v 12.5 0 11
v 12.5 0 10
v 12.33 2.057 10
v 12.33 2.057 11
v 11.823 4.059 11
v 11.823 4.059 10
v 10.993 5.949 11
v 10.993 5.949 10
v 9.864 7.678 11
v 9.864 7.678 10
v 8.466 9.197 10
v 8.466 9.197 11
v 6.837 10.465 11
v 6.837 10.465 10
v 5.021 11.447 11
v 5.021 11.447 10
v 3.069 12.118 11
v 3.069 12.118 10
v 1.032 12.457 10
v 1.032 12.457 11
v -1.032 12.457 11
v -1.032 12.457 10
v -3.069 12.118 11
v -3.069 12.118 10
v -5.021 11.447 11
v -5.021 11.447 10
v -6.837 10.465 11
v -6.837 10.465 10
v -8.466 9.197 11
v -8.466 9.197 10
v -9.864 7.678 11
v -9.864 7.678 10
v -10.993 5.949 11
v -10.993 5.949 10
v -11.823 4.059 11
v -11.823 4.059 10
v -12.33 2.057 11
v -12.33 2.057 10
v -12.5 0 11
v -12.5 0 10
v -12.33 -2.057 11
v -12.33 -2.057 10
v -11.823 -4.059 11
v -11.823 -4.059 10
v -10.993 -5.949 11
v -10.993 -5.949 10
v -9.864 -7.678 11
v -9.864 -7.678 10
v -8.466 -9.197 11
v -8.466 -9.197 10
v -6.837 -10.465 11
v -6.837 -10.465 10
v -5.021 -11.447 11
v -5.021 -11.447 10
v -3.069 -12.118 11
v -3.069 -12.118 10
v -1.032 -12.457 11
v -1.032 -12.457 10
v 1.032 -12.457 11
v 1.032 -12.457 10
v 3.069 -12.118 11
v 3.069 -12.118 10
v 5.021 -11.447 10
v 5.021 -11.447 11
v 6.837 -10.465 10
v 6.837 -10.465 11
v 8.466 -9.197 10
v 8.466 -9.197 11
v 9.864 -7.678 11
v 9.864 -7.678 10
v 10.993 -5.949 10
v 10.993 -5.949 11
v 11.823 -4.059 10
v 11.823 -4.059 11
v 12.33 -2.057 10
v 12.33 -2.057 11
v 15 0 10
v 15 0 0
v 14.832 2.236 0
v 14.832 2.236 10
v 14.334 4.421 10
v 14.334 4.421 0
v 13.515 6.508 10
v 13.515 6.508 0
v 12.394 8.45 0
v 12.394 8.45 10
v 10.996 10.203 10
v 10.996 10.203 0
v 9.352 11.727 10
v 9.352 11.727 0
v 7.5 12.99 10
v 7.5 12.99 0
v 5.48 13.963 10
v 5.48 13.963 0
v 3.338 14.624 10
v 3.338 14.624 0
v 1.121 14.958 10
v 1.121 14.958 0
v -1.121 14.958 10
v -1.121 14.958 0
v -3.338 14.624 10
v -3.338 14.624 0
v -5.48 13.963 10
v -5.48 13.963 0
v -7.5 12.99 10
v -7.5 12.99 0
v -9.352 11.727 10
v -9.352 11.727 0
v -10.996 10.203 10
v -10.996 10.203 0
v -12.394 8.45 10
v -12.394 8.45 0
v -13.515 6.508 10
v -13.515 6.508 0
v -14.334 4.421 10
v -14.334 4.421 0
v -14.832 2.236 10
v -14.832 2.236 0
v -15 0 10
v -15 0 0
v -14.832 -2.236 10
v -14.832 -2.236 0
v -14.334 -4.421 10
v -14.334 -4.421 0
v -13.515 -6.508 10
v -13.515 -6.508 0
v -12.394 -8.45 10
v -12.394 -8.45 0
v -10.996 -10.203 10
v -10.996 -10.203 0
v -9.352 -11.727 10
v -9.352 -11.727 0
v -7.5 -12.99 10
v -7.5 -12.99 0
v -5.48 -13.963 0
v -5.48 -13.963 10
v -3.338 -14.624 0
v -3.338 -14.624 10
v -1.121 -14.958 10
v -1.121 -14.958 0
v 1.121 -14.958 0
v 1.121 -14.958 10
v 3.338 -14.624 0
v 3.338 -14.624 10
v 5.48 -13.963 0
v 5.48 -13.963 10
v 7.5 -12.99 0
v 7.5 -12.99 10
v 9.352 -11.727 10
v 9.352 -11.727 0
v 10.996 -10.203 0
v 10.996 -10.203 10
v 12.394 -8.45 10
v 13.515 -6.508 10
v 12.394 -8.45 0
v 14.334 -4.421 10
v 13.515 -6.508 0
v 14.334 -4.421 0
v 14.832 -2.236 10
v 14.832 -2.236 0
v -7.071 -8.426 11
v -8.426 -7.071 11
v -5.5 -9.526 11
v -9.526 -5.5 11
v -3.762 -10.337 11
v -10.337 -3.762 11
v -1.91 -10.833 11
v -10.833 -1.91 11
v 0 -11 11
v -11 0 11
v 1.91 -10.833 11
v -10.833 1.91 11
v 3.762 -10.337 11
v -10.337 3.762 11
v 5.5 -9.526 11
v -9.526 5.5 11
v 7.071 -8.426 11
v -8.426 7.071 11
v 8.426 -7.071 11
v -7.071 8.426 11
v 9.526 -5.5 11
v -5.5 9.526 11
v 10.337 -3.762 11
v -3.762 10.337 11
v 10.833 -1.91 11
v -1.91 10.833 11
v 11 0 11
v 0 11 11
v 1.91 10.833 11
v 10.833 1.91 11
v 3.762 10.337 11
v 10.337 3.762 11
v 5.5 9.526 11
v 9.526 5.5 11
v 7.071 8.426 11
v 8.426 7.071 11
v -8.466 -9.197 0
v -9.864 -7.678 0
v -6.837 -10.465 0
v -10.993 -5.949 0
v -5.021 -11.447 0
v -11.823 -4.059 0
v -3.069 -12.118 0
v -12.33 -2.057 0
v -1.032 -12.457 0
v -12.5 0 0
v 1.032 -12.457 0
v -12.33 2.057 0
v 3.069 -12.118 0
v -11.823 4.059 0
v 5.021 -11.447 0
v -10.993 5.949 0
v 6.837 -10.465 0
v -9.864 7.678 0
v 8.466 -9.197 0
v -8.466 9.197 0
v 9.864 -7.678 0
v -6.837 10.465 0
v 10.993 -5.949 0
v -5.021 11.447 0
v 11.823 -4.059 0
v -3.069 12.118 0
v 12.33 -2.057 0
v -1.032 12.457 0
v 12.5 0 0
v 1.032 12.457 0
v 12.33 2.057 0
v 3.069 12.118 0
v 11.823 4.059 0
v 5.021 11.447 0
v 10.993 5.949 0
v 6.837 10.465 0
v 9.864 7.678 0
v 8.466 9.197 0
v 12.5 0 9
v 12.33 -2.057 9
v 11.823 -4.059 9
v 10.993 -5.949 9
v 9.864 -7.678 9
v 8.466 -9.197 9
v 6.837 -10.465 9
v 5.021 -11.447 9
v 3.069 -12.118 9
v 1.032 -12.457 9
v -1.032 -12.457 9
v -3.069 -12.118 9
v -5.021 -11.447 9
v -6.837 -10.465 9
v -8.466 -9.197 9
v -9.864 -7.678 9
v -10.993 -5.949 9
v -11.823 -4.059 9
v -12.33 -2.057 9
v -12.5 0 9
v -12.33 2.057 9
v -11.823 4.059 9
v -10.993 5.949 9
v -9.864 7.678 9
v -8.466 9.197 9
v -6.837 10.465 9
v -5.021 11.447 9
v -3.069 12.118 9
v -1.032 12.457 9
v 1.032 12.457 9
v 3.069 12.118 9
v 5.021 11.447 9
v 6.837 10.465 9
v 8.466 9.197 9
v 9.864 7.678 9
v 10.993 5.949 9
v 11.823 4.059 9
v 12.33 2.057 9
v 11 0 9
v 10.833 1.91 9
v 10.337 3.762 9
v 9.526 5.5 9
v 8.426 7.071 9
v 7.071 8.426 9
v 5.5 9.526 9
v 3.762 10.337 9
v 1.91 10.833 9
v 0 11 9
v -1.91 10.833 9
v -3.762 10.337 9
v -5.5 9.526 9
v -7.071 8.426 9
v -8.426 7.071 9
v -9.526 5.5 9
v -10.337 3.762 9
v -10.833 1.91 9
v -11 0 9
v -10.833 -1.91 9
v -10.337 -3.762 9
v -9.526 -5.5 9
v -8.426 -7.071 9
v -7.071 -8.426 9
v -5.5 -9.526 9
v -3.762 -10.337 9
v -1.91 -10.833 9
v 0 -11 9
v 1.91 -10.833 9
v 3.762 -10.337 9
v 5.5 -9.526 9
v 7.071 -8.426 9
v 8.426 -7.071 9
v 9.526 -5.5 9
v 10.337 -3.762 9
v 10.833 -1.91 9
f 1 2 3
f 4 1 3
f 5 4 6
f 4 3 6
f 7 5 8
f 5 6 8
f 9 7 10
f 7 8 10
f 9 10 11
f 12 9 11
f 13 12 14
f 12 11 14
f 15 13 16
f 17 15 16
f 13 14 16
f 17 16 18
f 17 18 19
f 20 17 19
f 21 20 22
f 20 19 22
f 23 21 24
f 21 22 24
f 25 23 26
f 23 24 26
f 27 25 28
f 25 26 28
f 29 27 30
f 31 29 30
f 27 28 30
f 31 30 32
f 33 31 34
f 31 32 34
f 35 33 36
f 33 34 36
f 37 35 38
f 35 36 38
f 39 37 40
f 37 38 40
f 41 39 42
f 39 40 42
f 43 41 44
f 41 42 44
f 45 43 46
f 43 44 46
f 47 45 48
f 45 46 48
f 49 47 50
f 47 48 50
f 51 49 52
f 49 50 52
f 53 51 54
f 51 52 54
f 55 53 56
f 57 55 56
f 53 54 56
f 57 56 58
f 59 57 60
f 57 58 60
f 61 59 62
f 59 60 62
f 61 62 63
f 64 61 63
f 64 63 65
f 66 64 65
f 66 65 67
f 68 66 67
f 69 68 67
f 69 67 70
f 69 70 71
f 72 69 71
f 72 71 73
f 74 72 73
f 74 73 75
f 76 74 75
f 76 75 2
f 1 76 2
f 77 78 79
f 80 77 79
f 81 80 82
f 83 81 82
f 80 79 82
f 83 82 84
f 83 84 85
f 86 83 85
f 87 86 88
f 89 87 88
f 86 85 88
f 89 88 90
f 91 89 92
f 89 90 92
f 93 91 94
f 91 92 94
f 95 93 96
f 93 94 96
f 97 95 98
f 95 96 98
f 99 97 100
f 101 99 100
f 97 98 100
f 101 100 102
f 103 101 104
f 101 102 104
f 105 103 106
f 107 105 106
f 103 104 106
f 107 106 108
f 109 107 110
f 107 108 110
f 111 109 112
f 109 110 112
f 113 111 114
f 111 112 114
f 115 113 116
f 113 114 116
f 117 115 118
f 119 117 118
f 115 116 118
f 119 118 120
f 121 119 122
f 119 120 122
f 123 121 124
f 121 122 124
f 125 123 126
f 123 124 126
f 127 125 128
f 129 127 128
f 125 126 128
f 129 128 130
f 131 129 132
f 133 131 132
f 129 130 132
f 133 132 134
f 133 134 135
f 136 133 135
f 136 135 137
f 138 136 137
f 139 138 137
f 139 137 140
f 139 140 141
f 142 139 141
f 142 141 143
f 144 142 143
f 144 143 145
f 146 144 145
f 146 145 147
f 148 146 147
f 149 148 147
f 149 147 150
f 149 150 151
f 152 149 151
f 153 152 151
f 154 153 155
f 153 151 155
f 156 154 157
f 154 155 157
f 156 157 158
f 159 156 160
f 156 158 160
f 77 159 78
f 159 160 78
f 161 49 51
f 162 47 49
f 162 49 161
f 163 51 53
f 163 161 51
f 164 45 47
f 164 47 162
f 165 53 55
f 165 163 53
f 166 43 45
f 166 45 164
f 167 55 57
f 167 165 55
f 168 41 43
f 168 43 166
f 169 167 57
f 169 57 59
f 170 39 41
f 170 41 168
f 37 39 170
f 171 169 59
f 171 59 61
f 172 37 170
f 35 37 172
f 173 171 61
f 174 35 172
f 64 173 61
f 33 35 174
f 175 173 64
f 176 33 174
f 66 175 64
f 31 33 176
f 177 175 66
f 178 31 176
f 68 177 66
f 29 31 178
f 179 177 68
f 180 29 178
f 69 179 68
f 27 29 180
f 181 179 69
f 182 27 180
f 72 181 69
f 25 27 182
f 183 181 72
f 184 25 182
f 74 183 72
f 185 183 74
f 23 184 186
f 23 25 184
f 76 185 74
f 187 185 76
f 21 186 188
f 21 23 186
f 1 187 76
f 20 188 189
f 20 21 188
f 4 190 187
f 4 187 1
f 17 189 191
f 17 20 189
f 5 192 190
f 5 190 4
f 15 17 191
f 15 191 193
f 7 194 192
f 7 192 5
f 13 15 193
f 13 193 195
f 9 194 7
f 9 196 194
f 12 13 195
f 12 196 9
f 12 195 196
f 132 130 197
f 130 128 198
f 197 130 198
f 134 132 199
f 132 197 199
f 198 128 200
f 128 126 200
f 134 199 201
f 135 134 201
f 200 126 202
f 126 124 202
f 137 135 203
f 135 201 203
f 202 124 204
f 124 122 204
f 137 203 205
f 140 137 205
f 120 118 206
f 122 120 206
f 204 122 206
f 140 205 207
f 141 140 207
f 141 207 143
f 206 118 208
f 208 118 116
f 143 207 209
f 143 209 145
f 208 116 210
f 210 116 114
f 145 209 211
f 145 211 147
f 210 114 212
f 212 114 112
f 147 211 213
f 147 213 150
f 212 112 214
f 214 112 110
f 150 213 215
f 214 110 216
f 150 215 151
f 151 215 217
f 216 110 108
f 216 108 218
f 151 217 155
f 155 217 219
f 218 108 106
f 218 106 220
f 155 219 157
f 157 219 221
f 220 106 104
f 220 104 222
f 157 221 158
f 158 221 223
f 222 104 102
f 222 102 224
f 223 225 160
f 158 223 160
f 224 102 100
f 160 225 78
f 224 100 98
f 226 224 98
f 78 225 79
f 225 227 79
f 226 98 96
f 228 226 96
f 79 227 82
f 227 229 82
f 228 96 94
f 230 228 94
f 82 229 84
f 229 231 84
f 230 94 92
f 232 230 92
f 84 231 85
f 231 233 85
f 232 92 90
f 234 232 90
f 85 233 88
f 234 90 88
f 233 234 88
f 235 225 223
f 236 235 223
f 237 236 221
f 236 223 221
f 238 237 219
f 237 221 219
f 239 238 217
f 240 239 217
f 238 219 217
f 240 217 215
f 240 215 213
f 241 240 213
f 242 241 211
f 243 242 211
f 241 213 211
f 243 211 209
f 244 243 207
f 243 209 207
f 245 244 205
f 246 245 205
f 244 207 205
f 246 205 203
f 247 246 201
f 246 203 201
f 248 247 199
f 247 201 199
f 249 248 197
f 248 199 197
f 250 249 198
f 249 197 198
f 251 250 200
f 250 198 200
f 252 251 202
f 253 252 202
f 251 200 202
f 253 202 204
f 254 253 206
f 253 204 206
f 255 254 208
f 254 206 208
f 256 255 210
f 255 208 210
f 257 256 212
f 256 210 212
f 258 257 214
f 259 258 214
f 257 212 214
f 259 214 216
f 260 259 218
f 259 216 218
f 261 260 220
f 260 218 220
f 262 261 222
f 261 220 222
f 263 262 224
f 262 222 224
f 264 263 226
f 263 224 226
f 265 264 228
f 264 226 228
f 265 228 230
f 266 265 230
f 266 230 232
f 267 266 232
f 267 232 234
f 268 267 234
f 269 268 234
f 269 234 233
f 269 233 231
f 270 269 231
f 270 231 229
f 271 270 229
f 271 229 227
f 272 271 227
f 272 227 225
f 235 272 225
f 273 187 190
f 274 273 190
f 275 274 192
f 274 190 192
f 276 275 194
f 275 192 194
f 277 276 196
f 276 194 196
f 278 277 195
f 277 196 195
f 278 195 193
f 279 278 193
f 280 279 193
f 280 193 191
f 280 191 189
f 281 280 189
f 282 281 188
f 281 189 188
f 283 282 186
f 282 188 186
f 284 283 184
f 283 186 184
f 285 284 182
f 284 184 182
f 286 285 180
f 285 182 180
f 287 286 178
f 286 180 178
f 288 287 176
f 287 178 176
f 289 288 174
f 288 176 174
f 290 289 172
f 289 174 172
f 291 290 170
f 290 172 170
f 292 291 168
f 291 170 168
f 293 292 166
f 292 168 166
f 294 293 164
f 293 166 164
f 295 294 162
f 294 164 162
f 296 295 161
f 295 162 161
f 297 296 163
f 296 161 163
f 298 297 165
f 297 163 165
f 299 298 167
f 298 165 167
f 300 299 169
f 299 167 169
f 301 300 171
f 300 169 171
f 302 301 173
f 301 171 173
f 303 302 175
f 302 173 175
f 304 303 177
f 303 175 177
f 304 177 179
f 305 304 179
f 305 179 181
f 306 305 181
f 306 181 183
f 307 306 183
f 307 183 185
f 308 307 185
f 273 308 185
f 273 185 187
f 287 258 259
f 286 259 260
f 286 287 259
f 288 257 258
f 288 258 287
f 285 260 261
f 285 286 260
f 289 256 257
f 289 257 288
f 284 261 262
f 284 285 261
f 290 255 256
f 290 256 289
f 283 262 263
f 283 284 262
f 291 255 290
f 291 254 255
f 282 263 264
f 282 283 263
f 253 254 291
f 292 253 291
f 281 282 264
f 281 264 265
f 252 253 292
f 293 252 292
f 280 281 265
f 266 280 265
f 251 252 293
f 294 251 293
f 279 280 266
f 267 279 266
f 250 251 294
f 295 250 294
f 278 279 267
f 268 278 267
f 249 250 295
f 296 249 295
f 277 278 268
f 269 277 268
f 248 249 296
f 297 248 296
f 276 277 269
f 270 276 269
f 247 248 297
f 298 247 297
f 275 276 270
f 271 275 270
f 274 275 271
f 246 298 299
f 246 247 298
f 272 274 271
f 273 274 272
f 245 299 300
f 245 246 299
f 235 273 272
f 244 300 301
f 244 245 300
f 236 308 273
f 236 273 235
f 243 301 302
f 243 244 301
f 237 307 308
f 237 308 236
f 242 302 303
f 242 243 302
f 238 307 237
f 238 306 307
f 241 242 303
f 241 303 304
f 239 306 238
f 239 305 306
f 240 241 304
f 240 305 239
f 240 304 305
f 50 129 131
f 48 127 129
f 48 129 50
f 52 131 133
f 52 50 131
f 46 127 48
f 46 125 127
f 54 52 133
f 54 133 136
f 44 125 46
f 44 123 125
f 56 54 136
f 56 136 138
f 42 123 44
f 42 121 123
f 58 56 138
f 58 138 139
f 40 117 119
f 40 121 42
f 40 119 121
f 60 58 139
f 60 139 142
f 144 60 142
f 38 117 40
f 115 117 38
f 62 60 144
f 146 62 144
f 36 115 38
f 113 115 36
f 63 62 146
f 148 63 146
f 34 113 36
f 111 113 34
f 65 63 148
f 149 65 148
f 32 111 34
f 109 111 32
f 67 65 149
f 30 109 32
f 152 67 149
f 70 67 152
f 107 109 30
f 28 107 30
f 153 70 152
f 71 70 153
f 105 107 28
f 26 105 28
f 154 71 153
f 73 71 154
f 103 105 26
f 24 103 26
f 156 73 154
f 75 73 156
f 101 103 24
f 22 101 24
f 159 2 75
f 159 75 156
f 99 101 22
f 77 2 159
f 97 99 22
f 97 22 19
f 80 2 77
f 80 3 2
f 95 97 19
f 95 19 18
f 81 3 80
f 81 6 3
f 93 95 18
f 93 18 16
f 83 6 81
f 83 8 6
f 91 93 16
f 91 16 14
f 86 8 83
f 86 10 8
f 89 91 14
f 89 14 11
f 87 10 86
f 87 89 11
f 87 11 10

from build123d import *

# Parameters (mm, degrees)
ESQUISSE1_R             = 15
BOSS_EXTRU_1_DEPTH      = 10
ESQUISSE2_R             = 12.5
BOSS_EXTRU_2_DEPTH      = 1
ESQUISSE3_R             = 11
ENL_V_MAT_EXTRU_1_DEPTH = 2
ESQUISSE4_R             = 12.5
ENL_V_MAT_EXTRU_2_DEPTH = 9


with BuildPart() as part:
    # Esquisse1 → Boss.-Extru.1 (new body)
    with BuildSketch(Plane.XY):
        Circle(ESQUISSE1_R)
    extrude(amount=BOSS_EXTRU_1_DEPTH)

    # Esquisse2 → Boss.-Extru.2 (add)
    with BuildSketch(Plane.XY.offset(10)):
        Circle(ESQUISSE2_R)
    extrude(amount=BOSS_EXTRU_2_DEPTH)

    # Esquisse3 → Enlèv. mat.-Extru.1 (cut)
    with BuildSketch(Plane.XY.offset(11)):
        Circle(ESQUISSE3_R)
    extrude(amount=-ENL_V_MAT_EXTRU_1_DEPTH, mode=Mode.SUBTRACT)

    # Esquisse4 → Enlèv. mat.-Extru.2 (cut)
    with BuildSketch(Plane(origin=(0, 0, 0), x_dir=(-1, 0, 0), z_dir=(0, 0, -1))):
        with Locations(Location((0, 0, 0), (0, 0, 180))):
            Circle(ESQUISSE4_R)
    extrude(amount=-ENL_V_MAT_EXTRU_2_DEPTH, mode=Mode.SUBTRACT)


solid = part.part
